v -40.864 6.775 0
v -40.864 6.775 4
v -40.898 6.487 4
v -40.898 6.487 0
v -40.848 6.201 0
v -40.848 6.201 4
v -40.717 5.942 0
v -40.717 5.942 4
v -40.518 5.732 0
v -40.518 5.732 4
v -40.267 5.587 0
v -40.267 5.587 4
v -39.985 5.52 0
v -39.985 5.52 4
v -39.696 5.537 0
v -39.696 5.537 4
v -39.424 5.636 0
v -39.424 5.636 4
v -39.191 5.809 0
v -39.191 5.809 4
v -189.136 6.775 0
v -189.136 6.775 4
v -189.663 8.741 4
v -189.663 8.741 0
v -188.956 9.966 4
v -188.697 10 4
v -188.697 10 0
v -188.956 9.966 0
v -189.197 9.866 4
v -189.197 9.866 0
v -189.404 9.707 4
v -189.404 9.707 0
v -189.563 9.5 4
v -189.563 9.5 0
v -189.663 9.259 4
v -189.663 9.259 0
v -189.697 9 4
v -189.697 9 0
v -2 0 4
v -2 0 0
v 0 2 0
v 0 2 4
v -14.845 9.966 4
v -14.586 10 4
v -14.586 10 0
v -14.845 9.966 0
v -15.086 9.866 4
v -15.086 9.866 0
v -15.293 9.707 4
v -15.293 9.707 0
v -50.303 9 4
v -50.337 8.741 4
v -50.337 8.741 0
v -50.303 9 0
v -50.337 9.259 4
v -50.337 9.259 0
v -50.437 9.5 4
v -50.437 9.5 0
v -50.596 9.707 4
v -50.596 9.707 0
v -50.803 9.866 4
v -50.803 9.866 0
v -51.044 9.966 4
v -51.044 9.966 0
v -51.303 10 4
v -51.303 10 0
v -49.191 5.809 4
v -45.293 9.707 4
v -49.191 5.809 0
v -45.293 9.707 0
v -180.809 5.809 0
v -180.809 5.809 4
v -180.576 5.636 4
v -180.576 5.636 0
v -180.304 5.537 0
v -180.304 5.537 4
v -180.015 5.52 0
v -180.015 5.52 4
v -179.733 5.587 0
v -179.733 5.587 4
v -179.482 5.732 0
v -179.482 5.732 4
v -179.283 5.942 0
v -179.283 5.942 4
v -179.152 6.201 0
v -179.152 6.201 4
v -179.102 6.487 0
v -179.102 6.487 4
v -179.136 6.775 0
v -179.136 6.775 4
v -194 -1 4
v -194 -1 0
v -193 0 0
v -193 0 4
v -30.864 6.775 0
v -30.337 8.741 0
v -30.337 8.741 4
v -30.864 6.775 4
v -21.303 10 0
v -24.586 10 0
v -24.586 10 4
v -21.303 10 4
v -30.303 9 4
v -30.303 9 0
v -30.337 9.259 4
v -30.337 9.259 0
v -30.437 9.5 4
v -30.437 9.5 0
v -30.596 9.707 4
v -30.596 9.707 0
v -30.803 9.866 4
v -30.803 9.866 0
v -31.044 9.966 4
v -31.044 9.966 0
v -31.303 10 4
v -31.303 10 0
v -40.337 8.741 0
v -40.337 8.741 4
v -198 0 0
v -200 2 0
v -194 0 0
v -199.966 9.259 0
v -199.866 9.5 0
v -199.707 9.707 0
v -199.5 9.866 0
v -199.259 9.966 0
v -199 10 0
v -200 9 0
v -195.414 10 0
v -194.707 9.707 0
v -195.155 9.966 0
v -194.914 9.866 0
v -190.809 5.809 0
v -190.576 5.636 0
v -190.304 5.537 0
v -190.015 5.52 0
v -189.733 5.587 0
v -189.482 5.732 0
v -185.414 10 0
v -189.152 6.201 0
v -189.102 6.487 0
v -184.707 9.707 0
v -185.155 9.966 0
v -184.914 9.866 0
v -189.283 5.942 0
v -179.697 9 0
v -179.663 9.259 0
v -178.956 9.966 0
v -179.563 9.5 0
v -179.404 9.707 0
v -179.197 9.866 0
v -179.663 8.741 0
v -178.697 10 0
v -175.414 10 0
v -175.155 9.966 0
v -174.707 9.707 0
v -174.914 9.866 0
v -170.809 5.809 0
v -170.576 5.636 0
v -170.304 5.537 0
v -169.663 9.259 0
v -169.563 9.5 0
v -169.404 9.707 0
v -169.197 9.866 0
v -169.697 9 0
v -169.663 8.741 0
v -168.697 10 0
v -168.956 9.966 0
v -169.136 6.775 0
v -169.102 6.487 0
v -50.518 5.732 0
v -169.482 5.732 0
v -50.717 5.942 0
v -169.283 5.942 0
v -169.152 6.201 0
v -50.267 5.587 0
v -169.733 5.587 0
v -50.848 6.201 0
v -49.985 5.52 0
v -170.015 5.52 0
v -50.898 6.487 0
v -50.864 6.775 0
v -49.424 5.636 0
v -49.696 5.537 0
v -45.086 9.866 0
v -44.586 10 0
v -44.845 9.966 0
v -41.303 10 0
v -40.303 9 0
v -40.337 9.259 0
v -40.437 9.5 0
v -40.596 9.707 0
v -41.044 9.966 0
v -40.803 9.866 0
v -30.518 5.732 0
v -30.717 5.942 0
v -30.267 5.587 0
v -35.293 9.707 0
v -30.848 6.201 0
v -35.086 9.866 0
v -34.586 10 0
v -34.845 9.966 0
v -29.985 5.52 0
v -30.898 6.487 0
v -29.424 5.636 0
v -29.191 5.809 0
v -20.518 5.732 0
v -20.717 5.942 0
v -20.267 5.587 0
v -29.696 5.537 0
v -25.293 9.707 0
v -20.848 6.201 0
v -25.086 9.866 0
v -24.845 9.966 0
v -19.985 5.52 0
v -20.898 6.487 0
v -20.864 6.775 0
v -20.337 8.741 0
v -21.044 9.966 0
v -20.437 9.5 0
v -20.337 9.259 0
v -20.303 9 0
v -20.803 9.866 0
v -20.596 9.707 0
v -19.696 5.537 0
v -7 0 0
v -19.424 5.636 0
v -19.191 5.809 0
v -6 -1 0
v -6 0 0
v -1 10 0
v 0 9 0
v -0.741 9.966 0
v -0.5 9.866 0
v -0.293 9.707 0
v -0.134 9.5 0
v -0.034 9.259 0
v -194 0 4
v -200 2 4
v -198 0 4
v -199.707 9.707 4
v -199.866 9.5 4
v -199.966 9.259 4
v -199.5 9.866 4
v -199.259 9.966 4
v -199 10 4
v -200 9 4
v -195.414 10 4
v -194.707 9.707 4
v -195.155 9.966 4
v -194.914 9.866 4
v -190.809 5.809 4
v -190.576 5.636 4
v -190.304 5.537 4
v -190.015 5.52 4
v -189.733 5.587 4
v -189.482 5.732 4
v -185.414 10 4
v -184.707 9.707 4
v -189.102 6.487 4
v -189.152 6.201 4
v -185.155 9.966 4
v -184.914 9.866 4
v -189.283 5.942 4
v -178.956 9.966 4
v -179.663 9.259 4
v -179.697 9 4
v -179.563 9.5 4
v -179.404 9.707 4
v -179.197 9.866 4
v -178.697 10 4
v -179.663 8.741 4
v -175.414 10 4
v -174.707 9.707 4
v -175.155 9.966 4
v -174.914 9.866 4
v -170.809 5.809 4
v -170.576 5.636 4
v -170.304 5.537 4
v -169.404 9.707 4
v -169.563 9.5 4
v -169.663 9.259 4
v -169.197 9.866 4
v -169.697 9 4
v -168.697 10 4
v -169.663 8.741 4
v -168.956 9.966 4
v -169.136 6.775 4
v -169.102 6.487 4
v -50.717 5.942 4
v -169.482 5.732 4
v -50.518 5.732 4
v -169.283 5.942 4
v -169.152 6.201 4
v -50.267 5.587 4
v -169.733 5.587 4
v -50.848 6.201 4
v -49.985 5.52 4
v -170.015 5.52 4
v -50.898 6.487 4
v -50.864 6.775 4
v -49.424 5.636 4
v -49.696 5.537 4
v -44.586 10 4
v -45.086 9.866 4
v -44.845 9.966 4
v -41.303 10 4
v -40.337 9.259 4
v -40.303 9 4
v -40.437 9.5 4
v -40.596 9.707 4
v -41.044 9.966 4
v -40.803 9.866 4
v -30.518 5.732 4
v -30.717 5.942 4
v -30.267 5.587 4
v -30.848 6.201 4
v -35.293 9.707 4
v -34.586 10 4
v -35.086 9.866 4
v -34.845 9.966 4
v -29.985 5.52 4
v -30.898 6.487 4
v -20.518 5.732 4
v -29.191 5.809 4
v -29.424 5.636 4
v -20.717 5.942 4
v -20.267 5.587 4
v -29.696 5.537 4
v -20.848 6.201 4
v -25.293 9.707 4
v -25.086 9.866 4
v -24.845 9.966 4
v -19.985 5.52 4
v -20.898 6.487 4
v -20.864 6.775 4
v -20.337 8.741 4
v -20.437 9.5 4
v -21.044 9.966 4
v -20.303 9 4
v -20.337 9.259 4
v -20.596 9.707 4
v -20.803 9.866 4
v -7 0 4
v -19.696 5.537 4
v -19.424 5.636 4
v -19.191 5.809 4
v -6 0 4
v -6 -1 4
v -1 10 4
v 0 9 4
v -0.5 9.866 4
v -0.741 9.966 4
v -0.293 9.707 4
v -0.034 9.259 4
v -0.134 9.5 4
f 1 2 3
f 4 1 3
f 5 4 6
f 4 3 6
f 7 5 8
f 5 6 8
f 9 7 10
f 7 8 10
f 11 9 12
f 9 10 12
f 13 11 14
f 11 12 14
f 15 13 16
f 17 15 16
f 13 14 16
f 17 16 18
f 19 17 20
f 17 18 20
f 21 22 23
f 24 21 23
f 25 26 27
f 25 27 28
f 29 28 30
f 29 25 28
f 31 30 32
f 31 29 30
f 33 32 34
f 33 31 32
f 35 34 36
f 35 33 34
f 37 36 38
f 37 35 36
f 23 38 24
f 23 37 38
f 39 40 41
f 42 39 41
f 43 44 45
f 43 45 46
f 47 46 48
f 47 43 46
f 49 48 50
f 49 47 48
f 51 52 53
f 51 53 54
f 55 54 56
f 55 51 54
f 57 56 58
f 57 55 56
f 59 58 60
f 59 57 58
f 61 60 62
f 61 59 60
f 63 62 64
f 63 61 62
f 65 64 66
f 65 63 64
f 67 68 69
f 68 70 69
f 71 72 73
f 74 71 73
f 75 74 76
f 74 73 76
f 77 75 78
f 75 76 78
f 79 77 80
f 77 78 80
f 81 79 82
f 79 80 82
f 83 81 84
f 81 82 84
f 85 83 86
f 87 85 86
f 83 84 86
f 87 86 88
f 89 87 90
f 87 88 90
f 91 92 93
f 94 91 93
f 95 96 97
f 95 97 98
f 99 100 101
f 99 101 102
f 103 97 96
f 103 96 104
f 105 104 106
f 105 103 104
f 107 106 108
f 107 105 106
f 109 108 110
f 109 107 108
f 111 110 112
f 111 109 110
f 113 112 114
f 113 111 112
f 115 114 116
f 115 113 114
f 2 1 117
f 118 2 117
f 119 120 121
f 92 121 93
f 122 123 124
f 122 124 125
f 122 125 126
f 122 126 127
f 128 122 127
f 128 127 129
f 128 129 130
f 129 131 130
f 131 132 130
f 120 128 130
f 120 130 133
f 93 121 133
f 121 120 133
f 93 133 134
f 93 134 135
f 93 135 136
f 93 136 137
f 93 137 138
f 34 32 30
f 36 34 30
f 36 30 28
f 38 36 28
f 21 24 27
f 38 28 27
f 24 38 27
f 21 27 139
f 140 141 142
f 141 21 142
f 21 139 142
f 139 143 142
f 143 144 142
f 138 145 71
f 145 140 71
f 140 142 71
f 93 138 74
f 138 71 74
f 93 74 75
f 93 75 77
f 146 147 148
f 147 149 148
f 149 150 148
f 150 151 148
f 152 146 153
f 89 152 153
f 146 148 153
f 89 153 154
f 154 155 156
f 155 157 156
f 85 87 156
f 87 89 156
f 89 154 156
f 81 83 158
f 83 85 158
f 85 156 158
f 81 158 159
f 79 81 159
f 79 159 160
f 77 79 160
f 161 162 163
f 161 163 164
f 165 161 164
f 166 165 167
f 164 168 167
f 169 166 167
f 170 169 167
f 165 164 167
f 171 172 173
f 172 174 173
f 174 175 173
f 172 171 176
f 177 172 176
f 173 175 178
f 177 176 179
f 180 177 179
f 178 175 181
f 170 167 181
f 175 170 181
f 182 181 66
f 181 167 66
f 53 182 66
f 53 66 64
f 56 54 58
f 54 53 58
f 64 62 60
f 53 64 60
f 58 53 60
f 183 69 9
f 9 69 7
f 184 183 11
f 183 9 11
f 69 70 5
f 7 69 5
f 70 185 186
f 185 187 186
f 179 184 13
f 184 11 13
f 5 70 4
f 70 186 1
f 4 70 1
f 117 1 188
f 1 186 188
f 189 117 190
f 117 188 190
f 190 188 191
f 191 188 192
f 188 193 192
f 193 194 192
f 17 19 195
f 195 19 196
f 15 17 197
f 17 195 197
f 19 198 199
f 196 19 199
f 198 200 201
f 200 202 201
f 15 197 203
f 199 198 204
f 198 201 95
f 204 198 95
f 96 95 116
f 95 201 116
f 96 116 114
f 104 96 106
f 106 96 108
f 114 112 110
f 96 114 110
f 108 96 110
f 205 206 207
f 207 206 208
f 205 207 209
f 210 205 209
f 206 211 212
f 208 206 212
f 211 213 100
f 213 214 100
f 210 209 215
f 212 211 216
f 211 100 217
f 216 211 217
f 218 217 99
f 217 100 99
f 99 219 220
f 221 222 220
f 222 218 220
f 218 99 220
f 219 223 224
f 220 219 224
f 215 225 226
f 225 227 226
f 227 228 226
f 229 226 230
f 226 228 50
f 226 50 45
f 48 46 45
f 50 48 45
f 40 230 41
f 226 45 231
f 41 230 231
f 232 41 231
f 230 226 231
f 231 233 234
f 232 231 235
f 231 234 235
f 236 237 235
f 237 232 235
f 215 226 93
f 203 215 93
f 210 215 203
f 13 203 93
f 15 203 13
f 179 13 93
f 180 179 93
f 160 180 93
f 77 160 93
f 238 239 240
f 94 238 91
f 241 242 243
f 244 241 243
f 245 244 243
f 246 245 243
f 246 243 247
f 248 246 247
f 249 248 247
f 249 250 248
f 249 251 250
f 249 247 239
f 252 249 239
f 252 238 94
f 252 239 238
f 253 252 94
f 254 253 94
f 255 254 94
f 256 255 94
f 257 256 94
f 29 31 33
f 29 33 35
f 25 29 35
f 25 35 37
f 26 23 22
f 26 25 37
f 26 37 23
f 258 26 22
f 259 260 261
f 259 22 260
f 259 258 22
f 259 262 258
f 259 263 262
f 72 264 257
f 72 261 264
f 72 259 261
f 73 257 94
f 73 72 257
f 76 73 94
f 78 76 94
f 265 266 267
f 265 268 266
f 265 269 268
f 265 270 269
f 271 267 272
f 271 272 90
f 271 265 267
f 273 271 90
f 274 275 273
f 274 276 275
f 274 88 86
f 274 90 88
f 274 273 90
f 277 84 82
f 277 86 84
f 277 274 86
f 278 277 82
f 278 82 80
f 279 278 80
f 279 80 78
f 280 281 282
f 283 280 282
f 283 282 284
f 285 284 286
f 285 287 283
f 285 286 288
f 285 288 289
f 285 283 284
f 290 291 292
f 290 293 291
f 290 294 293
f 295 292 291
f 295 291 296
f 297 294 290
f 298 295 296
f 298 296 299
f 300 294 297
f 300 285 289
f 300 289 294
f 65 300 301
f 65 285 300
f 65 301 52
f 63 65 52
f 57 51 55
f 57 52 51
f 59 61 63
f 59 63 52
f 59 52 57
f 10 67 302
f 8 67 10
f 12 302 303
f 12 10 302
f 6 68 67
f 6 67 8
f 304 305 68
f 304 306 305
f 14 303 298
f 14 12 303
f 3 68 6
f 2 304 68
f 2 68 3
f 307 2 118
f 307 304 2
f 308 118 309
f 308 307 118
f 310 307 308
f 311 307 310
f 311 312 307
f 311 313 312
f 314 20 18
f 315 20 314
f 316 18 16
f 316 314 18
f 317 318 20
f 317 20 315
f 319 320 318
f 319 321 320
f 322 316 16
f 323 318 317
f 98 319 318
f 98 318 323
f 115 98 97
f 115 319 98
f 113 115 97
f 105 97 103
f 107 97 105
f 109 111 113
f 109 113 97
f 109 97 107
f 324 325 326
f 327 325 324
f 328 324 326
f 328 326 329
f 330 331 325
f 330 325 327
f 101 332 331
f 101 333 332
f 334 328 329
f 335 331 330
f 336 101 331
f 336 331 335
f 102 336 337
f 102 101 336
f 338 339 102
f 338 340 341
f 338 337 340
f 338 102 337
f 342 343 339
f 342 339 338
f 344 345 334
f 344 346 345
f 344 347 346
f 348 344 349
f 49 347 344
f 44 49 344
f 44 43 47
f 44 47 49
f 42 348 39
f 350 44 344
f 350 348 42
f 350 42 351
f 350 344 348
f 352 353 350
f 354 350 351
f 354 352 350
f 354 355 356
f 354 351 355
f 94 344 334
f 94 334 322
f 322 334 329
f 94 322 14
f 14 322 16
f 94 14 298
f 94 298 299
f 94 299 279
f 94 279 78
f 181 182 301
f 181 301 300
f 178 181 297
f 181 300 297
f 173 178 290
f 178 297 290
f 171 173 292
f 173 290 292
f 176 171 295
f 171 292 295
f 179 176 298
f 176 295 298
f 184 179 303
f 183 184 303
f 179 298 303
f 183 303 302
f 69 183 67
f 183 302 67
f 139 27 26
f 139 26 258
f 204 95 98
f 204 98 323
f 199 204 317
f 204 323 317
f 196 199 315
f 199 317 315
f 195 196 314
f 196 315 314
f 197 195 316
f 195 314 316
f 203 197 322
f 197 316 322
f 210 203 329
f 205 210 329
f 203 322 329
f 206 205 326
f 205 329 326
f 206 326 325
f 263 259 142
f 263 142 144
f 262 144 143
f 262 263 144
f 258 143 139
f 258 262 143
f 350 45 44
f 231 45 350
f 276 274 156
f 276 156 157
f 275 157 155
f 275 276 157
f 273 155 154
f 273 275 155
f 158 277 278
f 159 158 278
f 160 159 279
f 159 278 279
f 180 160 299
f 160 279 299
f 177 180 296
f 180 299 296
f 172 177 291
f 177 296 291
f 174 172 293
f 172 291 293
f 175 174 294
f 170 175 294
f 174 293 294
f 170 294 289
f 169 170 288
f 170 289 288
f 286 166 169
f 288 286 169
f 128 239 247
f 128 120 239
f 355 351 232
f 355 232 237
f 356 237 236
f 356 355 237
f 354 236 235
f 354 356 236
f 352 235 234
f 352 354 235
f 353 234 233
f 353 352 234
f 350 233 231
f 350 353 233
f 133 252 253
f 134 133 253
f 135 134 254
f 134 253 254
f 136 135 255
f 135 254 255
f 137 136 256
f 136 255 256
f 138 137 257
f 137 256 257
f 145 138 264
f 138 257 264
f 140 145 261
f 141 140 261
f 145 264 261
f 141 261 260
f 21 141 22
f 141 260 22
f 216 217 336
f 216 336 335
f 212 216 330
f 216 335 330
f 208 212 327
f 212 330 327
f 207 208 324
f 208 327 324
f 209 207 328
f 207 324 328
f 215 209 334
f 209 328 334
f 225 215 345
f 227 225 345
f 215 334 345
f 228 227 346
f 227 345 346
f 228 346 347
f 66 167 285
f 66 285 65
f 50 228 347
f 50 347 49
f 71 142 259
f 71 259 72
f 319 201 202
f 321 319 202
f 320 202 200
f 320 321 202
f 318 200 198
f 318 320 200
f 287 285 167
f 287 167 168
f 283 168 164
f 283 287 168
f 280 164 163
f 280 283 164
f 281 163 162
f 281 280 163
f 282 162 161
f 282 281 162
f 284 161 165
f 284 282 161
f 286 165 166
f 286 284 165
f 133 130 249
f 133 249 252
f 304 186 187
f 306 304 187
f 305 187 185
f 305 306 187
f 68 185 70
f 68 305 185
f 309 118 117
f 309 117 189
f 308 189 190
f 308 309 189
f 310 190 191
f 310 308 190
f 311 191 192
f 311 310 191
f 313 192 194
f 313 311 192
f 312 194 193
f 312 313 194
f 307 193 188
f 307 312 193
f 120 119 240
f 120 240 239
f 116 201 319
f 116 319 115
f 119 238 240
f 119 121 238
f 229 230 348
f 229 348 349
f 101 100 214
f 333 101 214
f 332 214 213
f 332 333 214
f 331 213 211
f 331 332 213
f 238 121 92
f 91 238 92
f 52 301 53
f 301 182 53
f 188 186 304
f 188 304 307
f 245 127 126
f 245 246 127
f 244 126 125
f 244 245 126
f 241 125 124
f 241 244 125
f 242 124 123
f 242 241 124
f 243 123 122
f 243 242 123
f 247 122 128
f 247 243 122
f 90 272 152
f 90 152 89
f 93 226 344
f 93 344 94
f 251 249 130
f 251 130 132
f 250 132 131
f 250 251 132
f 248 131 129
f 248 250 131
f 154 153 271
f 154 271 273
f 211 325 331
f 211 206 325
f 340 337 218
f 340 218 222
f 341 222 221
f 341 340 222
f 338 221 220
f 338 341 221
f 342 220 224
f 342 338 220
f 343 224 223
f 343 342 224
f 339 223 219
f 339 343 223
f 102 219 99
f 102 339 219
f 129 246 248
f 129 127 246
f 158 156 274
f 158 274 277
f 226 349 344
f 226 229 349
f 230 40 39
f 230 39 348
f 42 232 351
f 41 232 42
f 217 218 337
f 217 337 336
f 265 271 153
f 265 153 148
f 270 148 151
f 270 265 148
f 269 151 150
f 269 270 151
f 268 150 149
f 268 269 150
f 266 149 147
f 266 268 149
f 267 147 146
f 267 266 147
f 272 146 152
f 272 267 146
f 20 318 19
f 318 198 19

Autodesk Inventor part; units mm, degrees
ref_plane "YZ Plane" through (0, 0, 0) normal (1, 0, 0) x (0, 1, 0)
ref_plane "XZ Plane" through (0, 0, 0) normal (0, 1, 0) x (-1, 0, 0)
ref_plane "XY Plane" through (0, 0, 0) normal (0, 0, 1) x (1, 0, 0)
sketch "Эскиз1" plane through (0, 0, 0) normal (0, 0, 1) x (1, 0, 0)
  line L0 (0, 0) -> (-200, 0)
  line L1 (-200, 0) -> (-200, 10)
  line L2 (-200, 10) -> (0, 10)
  line L3 (0, 10) -> (0, 0)
  line L4 (-156.1916, 10) -> (-150.6349, 10) construction
  line L5 (-195, 10) -> (-188.1699, 3.1699)
  line L6 (-185, 10) -> (-178.1699, 3.1699)
  line L7 (-175, 10) -> (-168.1699, 3.1699)
  line L8 (-40, 10) -> (-34.5353, 10)
  line L9 (-30, 10) -> (-25, 10)
  line L10 (-23.8869, 10) -> (-18.8869, 10)
  line L11 (-45, 10) -> (-50, 10)
  line L12 (-200, 0) -> (-199, -1)
  line L13 (-200, 0) -> (-198.5858, 0) construction
  line L14 (-199, -1) -> (-199, 0)
  line L15 (-194, 0) -> (-194, -1)
  line L16 (-194, -1) -> (-193, 0)
  line L17 (0, 0) -> (-1, -1)
  line L18 (0, 0) -> (1.4142, 0) construction
  line L19 (-1, -1) -> (-1, 0)
  line L20 (-6, 0) -> (-6, -1)
  line L21 (-6, -1) -> (-7, 0)
  line L22 (-102, 0) -> (-102, -1)
  line L23 (-102, -1) -> (-103, 0)
  line L24 (-98, 0) -> (-98, -1)
  line L25 (-98, -1) -> (-97, 0)
  line L26 (-188.1699, 3.1699) -> (-190, 10)
  line L27 (-180, 10) -> (-178.1699, 3.1699)
  line L28 (-170, 10) -> (-168.1699, 3.1699)
  line L29 (-35, 10) -> (-41.8301, 3.1699)
  line L30 (-41.8301, 3.1699) -> (-40, 10)
  line L31 (-30, 10) -> (-31.8301, 3.1699)
  line L32 (-31.8301, 3.1699) -> (-25, 10)
  line L33 (-20, 10) -> (-21.8301, 3.1699)
  line L34 (-21.8301, 3.1699) -> (-15, 10)
  line L35 (-45, 10) -> (-51.8301, 3.1699)
  line L36 (-51.8301, 3.1699) -> (-50, 10)
  line L37 (-198, 0) -> (-200, 2)
  line L38 (-2, 0) -> (0, 2)
  point P0 (-200, 5)
  point P1 (-100, 0)
  point P2 (-191.5849, 6.5849)
  dimension "d0" = 200
  dimension "d1" = 10
  dimension "d3" = 45
  dimension "d4" = 5
  dimension "d7" = 5
  dimension "d8" = 45
  dimension "d9" = 45
  dimension "d10" = 0
  dimension "d11" = 0
  dimension "d21" = 45
  dimension "d22" = 45
  dimension "d23" = 1
  dimension "d25" = 1
  dimension "d26" = 135
  dimension "d27" = 1
  dimension "d29" = 1
  dimension "d30" = 45
  dimension "d31" = 2
  dimension "d32" = 45
  dimension "d33" = 1
  dimension "d34" = 1
  dimension "d35" = 2
  dimension "d36" = 45
  dimension "d37" = 75
  dimension "d38" = 5
  dimension "d40" = 5
  dimension "d41" = 5
  dimension "d42" = 5
  dimension "d43" = 150
  dimension "d44" = 5
  dimension "d46" = 5
  dimension "d47" = 5
  dimension "d48" = 5
  dimension "d49" = 5
  dimension "d51" = 45
  dimension "d52" = 75
  dimension "d53" = 5
  dimension "d54" = 5
  dimension "d55" = 75
  dimension "d56" = 75
  dimension "d57" = 45
  dimension "d58" = 45
  dimension "d59" = 45
  dimension "d60" = 75
  dimension "d67" = 45
  dimension "d68" = 2
  dimension "d69" = 4
  dimension "d70" = 45
  dimension "d71" = 2
  dimension "d72" = 4
extrude "Выдавливание1" add sketch "Эскиз1" along normal blind 4 contours L38 L0 L37 L1 L2 L5 L26 L6 L27 L7 L28 L36 L35 L30 L29 L31 L32 L33 L34 L3 | L20 L21 L0 | L16 L15 L0
fillet "Сопряжение1" radius 1 21 edges at (-190, 10, 2) (-188.1699, 3.1699, 2) (-195, 10, 2) (-185, 10, 2) (-178.1699, 3.1699, 2) (-180, 10, 2) (-168.1699, 3.1699, 2) (-175, 10, 2) (-170, 10, 2) (-50, 10, 2) (-51.8301, 3.1699, 2) (-41.8301, 3.1699, 2) (-31.8301, 3.1699, 2) (-30, 10, 2) (-40, 10, 2) (-45, 10, 2) (-35, 10, 2) (-25, 10, 2) (-20, 10, 2) (-21.8301, 3.1699, 2) (-15, 10, 2)
fillet "Сопряжение2" radius 1 2 edges at (0, 10, 2) (-200, 10, 2)
properties part number "trunk"
